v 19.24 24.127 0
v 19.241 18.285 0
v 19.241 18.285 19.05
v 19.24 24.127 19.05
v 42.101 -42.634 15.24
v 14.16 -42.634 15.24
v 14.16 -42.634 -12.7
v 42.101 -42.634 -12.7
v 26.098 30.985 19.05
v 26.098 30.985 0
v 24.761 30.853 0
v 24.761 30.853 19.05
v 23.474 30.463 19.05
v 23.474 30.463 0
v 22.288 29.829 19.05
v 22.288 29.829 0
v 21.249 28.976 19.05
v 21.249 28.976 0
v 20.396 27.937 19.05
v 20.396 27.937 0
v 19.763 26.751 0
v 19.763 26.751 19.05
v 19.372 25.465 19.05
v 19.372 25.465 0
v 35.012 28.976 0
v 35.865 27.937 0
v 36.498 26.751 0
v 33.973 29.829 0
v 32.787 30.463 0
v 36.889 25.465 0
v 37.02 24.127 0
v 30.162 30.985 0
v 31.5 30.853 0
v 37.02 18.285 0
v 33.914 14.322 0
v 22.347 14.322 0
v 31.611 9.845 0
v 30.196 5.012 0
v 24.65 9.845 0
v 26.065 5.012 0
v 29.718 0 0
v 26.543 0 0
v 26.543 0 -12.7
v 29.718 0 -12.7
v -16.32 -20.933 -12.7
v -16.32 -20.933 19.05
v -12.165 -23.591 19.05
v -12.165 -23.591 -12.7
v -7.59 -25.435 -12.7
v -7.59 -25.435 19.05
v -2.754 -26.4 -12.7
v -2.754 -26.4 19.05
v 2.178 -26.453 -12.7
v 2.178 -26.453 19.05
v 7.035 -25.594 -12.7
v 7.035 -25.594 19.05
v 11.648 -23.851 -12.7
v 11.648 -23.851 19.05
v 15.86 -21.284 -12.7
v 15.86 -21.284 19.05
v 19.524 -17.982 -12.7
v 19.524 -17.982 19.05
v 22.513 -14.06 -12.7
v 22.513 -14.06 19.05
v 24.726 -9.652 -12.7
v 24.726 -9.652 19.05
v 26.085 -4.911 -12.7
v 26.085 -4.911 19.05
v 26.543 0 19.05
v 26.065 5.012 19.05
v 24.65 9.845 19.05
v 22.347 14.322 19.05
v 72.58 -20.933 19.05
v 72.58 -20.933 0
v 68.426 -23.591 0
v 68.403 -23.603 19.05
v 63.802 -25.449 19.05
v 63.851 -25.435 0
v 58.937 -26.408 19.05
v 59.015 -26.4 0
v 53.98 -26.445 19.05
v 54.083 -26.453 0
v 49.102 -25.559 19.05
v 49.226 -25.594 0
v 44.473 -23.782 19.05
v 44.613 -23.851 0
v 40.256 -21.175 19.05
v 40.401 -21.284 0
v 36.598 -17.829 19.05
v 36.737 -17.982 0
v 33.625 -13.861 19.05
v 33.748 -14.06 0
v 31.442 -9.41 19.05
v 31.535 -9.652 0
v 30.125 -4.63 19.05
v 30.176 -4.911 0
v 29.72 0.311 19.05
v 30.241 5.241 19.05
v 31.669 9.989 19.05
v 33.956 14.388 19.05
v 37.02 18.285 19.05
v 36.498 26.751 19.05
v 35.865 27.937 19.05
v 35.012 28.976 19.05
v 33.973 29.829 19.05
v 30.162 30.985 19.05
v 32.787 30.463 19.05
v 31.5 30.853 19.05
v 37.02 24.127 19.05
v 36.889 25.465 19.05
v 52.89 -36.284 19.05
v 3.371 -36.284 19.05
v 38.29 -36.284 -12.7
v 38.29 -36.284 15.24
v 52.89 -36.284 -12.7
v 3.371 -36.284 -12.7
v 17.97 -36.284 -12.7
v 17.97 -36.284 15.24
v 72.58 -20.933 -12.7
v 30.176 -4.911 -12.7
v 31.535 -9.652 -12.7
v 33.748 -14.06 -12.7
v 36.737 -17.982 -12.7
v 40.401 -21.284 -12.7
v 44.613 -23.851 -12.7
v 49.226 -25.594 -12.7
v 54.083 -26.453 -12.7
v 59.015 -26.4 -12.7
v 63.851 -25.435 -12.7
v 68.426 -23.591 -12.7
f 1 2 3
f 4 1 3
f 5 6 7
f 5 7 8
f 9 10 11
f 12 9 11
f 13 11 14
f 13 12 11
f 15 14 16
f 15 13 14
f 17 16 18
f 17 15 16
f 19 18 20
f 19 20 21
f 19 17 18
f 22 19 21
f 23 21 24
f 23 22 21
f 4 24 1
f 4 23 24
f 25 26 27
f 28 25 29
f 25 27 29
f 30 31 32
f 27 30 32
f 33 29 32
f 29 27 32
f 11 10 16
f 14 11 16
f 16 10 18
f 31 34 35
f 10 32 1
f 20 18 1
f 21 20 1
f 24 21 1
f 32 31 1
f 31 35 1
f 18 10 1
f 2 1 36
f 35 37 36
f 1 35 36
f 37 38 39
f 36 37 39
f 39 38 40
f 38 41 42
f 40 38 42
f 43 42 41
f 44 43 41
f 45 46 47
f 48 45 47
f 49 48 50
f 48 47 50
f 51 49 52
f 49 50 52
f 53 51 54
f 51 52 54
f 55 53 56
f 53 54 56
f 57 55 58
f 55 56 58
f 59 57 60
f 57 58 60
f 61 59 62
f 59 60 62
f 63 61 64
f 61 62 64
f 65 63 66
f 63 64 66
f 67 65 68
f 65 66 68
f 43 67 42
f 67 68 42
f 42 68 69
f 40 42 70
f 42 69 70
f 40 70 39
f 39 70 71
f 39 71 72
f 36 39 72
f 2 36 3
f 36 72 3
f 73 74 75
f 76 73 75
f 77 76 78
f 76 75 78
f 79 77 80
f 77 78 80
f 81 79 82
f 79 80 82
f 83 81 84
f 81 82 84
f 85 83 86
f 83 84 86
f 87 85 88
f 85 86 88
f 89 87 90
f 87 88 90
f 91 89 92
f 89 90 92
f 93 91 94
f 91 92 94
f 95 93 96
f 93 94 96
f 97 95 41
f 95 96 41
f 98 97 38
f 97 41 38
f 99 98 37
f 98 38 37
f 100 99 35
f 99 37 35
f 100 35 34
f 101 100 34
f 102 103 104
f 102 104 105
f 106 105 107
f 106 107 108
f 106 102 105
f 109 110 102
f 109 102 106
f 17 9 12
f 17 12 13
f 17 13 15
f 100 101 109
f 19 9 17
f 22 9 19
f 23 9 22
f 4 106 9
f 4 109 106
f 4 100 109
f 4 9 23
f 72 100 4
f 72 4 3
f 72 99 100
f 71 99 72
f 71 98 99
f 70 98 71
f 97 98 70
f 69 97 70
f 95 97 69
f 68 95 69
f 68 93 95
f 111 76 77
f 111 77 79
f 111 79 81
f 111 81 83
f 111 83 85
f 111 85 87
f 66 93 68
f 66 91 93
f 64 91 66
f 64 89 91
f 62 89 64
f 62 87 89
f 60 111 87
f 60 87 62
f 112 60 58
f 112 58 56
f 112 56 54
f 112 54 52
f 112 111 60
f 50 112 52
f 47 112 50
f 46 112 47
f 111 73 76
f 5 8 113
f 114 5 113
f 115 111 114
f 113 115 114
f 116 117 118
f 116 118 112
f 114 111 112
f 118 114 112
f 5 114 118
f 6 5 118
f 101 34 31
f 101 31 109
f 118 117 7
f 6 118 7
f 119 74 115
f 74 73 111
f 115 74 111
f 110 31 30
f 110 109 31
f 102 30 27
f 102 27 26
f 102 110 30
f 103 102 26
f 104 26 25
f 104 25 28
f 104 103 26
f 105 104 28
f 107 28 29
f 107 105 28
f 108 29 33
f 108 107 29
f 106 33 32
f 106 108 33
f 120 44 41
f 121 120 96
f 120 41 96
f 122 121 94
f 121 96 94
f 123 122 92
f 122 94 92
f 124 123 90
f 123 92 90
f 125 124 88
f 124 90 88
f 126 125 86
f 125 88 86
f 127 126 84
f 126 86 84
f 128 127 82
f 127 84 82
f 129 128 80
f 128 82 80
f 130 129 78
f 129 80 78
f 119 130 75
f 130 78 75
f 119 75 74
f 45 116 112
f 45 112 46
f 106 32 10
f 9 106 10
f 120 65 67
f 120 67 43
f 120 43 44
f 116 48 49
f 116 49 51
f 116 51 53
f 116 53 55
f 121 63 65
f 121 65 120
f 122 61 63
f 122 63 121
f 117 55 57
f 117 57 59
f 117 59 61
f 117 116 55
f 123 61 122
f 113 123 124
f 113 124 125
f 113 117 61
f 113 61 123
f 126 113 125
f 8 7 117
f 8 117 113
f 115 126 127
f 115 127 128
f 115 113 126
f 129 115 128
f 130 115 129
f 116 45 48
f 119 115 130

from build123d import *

# Parameters (mm, degrees)
F1_DEPTH = 19.05
F3_DEPTH = 12.7
F4_DEPTH = 12.7
F5_W     = 3.81
F5_H     = 27.94
F5_W_2   = 20.32
F6_DEPTH = 6.35
F8_DEPTH = 40.386
F9_R     = 6.858


with BuildPart() as f1:
    # F0 (on Top) → F1 (new body)
    with BuildSketch(Plane.XY):
        with BuildLine():
            ThreePointArc((19.2405, 18.2848026719), (24.6498624793, 9.844548174), (26.543, 0))
            ThreePointArc((26.543, 0), (11.6482264852, -23.8505695687), (-16.3195, -20.9333410795))
            Line((-16.3195, -20.9333410795), (3.3713763961, -36.2842234889))
            Line((3.3713763961, -36.2842234889), (52.8896236039, -36.2842234889))
            Line((52.8896236039, -36.2842234889), (72.5805, -20.9333410795))
            ThreePointArc((72.5805, -20.9333410795), (36.597613718, -17.8292481312), (37.0205, 18.2848026719))
            Line((37.0205, 18.2848026719), (19.2405, 18.2848026719))
        make_face()
    extrude(amount=F1_DEPTH)

    # F2 (on face) → F3 (join)
    with BuildSketch(Plane(origin=(0, 0, 0), x_dir=(1, 0, 0), z_dir=(0, 0, -1))):
        with BuildLine():
            ThreePointArc((-16.3195, 20.9333410795), (11.6482264852, 23.8505695687), (26.543, 0))
            Line((26.543, 0), (29.718, 0))
            ThreePointArc((29.718, 0), (44.6127735148, 23.8505695687), (72.5805, 20.9333410795))
            Line((72.5805, 20.9333410795), (52.8896236039, 36.2842234889))
            Line((52.8896236039, 36.2842234889), (3.3713763961, 36.2842234889))
            Line((3.3713763961, 36.2842234889), (-16.3195, 20.9333410795))
        make_face()
    extrude(amount=F3_DEPTH)

    # F4 (add): a face of the model
    f4_faces = [f1.faces().sort_by_distance(p)[0] for p in [
        (28.1305, 18.2848026719, 9.525),
    ]]
    extrude(f4_faces, amount=F4_DEPTH)

    # F5 (on face) → F6 (join)
    with BuildSketch(Plane.XZ.offset(36.2842234889)):
        with Locations((40.1955, 1.27)):
            Rectangle(F5_W, F5_H)
        with Locations((28.1305, 1.27)):
            Rectangle(F5_W_2, F5_H)
        with Locations((16.0655, 1.27)):
            Rectangle(F5_W, F5_H)
    extrude(amount=F6_DEPTH)

    # F7 (on face) → F8 (cut)
    with BuildSketch(Plane(origin=(0, 0, -12.7), x_dir=(1, 0, 0), z_dir=(0, 0, -1))):
        Polygon((42.1005, 42.6342234889), (38.2905, 36.2842234889), (42.1005, 36.2842234889), (42.1005, 42.0675911009), align=None)
        Polygon((17.9705, 36.2842234889), (14.1605, 42.6342234889), (14.1605, 36.2842234889), align=None)
    extrude(amount=-F8_DEPTH, mode=Mode.SUBTRACT)

    # F9
    f9_edges = [f1.edges().sort_by_distance(p)[0] for p in [
        (37.0205, 30.984803, 9.525),
        (19.2405, 30.984803, 9.525),
    ]]
    fillet(f9_edges, radius=F9_R)


solid = f1.part
